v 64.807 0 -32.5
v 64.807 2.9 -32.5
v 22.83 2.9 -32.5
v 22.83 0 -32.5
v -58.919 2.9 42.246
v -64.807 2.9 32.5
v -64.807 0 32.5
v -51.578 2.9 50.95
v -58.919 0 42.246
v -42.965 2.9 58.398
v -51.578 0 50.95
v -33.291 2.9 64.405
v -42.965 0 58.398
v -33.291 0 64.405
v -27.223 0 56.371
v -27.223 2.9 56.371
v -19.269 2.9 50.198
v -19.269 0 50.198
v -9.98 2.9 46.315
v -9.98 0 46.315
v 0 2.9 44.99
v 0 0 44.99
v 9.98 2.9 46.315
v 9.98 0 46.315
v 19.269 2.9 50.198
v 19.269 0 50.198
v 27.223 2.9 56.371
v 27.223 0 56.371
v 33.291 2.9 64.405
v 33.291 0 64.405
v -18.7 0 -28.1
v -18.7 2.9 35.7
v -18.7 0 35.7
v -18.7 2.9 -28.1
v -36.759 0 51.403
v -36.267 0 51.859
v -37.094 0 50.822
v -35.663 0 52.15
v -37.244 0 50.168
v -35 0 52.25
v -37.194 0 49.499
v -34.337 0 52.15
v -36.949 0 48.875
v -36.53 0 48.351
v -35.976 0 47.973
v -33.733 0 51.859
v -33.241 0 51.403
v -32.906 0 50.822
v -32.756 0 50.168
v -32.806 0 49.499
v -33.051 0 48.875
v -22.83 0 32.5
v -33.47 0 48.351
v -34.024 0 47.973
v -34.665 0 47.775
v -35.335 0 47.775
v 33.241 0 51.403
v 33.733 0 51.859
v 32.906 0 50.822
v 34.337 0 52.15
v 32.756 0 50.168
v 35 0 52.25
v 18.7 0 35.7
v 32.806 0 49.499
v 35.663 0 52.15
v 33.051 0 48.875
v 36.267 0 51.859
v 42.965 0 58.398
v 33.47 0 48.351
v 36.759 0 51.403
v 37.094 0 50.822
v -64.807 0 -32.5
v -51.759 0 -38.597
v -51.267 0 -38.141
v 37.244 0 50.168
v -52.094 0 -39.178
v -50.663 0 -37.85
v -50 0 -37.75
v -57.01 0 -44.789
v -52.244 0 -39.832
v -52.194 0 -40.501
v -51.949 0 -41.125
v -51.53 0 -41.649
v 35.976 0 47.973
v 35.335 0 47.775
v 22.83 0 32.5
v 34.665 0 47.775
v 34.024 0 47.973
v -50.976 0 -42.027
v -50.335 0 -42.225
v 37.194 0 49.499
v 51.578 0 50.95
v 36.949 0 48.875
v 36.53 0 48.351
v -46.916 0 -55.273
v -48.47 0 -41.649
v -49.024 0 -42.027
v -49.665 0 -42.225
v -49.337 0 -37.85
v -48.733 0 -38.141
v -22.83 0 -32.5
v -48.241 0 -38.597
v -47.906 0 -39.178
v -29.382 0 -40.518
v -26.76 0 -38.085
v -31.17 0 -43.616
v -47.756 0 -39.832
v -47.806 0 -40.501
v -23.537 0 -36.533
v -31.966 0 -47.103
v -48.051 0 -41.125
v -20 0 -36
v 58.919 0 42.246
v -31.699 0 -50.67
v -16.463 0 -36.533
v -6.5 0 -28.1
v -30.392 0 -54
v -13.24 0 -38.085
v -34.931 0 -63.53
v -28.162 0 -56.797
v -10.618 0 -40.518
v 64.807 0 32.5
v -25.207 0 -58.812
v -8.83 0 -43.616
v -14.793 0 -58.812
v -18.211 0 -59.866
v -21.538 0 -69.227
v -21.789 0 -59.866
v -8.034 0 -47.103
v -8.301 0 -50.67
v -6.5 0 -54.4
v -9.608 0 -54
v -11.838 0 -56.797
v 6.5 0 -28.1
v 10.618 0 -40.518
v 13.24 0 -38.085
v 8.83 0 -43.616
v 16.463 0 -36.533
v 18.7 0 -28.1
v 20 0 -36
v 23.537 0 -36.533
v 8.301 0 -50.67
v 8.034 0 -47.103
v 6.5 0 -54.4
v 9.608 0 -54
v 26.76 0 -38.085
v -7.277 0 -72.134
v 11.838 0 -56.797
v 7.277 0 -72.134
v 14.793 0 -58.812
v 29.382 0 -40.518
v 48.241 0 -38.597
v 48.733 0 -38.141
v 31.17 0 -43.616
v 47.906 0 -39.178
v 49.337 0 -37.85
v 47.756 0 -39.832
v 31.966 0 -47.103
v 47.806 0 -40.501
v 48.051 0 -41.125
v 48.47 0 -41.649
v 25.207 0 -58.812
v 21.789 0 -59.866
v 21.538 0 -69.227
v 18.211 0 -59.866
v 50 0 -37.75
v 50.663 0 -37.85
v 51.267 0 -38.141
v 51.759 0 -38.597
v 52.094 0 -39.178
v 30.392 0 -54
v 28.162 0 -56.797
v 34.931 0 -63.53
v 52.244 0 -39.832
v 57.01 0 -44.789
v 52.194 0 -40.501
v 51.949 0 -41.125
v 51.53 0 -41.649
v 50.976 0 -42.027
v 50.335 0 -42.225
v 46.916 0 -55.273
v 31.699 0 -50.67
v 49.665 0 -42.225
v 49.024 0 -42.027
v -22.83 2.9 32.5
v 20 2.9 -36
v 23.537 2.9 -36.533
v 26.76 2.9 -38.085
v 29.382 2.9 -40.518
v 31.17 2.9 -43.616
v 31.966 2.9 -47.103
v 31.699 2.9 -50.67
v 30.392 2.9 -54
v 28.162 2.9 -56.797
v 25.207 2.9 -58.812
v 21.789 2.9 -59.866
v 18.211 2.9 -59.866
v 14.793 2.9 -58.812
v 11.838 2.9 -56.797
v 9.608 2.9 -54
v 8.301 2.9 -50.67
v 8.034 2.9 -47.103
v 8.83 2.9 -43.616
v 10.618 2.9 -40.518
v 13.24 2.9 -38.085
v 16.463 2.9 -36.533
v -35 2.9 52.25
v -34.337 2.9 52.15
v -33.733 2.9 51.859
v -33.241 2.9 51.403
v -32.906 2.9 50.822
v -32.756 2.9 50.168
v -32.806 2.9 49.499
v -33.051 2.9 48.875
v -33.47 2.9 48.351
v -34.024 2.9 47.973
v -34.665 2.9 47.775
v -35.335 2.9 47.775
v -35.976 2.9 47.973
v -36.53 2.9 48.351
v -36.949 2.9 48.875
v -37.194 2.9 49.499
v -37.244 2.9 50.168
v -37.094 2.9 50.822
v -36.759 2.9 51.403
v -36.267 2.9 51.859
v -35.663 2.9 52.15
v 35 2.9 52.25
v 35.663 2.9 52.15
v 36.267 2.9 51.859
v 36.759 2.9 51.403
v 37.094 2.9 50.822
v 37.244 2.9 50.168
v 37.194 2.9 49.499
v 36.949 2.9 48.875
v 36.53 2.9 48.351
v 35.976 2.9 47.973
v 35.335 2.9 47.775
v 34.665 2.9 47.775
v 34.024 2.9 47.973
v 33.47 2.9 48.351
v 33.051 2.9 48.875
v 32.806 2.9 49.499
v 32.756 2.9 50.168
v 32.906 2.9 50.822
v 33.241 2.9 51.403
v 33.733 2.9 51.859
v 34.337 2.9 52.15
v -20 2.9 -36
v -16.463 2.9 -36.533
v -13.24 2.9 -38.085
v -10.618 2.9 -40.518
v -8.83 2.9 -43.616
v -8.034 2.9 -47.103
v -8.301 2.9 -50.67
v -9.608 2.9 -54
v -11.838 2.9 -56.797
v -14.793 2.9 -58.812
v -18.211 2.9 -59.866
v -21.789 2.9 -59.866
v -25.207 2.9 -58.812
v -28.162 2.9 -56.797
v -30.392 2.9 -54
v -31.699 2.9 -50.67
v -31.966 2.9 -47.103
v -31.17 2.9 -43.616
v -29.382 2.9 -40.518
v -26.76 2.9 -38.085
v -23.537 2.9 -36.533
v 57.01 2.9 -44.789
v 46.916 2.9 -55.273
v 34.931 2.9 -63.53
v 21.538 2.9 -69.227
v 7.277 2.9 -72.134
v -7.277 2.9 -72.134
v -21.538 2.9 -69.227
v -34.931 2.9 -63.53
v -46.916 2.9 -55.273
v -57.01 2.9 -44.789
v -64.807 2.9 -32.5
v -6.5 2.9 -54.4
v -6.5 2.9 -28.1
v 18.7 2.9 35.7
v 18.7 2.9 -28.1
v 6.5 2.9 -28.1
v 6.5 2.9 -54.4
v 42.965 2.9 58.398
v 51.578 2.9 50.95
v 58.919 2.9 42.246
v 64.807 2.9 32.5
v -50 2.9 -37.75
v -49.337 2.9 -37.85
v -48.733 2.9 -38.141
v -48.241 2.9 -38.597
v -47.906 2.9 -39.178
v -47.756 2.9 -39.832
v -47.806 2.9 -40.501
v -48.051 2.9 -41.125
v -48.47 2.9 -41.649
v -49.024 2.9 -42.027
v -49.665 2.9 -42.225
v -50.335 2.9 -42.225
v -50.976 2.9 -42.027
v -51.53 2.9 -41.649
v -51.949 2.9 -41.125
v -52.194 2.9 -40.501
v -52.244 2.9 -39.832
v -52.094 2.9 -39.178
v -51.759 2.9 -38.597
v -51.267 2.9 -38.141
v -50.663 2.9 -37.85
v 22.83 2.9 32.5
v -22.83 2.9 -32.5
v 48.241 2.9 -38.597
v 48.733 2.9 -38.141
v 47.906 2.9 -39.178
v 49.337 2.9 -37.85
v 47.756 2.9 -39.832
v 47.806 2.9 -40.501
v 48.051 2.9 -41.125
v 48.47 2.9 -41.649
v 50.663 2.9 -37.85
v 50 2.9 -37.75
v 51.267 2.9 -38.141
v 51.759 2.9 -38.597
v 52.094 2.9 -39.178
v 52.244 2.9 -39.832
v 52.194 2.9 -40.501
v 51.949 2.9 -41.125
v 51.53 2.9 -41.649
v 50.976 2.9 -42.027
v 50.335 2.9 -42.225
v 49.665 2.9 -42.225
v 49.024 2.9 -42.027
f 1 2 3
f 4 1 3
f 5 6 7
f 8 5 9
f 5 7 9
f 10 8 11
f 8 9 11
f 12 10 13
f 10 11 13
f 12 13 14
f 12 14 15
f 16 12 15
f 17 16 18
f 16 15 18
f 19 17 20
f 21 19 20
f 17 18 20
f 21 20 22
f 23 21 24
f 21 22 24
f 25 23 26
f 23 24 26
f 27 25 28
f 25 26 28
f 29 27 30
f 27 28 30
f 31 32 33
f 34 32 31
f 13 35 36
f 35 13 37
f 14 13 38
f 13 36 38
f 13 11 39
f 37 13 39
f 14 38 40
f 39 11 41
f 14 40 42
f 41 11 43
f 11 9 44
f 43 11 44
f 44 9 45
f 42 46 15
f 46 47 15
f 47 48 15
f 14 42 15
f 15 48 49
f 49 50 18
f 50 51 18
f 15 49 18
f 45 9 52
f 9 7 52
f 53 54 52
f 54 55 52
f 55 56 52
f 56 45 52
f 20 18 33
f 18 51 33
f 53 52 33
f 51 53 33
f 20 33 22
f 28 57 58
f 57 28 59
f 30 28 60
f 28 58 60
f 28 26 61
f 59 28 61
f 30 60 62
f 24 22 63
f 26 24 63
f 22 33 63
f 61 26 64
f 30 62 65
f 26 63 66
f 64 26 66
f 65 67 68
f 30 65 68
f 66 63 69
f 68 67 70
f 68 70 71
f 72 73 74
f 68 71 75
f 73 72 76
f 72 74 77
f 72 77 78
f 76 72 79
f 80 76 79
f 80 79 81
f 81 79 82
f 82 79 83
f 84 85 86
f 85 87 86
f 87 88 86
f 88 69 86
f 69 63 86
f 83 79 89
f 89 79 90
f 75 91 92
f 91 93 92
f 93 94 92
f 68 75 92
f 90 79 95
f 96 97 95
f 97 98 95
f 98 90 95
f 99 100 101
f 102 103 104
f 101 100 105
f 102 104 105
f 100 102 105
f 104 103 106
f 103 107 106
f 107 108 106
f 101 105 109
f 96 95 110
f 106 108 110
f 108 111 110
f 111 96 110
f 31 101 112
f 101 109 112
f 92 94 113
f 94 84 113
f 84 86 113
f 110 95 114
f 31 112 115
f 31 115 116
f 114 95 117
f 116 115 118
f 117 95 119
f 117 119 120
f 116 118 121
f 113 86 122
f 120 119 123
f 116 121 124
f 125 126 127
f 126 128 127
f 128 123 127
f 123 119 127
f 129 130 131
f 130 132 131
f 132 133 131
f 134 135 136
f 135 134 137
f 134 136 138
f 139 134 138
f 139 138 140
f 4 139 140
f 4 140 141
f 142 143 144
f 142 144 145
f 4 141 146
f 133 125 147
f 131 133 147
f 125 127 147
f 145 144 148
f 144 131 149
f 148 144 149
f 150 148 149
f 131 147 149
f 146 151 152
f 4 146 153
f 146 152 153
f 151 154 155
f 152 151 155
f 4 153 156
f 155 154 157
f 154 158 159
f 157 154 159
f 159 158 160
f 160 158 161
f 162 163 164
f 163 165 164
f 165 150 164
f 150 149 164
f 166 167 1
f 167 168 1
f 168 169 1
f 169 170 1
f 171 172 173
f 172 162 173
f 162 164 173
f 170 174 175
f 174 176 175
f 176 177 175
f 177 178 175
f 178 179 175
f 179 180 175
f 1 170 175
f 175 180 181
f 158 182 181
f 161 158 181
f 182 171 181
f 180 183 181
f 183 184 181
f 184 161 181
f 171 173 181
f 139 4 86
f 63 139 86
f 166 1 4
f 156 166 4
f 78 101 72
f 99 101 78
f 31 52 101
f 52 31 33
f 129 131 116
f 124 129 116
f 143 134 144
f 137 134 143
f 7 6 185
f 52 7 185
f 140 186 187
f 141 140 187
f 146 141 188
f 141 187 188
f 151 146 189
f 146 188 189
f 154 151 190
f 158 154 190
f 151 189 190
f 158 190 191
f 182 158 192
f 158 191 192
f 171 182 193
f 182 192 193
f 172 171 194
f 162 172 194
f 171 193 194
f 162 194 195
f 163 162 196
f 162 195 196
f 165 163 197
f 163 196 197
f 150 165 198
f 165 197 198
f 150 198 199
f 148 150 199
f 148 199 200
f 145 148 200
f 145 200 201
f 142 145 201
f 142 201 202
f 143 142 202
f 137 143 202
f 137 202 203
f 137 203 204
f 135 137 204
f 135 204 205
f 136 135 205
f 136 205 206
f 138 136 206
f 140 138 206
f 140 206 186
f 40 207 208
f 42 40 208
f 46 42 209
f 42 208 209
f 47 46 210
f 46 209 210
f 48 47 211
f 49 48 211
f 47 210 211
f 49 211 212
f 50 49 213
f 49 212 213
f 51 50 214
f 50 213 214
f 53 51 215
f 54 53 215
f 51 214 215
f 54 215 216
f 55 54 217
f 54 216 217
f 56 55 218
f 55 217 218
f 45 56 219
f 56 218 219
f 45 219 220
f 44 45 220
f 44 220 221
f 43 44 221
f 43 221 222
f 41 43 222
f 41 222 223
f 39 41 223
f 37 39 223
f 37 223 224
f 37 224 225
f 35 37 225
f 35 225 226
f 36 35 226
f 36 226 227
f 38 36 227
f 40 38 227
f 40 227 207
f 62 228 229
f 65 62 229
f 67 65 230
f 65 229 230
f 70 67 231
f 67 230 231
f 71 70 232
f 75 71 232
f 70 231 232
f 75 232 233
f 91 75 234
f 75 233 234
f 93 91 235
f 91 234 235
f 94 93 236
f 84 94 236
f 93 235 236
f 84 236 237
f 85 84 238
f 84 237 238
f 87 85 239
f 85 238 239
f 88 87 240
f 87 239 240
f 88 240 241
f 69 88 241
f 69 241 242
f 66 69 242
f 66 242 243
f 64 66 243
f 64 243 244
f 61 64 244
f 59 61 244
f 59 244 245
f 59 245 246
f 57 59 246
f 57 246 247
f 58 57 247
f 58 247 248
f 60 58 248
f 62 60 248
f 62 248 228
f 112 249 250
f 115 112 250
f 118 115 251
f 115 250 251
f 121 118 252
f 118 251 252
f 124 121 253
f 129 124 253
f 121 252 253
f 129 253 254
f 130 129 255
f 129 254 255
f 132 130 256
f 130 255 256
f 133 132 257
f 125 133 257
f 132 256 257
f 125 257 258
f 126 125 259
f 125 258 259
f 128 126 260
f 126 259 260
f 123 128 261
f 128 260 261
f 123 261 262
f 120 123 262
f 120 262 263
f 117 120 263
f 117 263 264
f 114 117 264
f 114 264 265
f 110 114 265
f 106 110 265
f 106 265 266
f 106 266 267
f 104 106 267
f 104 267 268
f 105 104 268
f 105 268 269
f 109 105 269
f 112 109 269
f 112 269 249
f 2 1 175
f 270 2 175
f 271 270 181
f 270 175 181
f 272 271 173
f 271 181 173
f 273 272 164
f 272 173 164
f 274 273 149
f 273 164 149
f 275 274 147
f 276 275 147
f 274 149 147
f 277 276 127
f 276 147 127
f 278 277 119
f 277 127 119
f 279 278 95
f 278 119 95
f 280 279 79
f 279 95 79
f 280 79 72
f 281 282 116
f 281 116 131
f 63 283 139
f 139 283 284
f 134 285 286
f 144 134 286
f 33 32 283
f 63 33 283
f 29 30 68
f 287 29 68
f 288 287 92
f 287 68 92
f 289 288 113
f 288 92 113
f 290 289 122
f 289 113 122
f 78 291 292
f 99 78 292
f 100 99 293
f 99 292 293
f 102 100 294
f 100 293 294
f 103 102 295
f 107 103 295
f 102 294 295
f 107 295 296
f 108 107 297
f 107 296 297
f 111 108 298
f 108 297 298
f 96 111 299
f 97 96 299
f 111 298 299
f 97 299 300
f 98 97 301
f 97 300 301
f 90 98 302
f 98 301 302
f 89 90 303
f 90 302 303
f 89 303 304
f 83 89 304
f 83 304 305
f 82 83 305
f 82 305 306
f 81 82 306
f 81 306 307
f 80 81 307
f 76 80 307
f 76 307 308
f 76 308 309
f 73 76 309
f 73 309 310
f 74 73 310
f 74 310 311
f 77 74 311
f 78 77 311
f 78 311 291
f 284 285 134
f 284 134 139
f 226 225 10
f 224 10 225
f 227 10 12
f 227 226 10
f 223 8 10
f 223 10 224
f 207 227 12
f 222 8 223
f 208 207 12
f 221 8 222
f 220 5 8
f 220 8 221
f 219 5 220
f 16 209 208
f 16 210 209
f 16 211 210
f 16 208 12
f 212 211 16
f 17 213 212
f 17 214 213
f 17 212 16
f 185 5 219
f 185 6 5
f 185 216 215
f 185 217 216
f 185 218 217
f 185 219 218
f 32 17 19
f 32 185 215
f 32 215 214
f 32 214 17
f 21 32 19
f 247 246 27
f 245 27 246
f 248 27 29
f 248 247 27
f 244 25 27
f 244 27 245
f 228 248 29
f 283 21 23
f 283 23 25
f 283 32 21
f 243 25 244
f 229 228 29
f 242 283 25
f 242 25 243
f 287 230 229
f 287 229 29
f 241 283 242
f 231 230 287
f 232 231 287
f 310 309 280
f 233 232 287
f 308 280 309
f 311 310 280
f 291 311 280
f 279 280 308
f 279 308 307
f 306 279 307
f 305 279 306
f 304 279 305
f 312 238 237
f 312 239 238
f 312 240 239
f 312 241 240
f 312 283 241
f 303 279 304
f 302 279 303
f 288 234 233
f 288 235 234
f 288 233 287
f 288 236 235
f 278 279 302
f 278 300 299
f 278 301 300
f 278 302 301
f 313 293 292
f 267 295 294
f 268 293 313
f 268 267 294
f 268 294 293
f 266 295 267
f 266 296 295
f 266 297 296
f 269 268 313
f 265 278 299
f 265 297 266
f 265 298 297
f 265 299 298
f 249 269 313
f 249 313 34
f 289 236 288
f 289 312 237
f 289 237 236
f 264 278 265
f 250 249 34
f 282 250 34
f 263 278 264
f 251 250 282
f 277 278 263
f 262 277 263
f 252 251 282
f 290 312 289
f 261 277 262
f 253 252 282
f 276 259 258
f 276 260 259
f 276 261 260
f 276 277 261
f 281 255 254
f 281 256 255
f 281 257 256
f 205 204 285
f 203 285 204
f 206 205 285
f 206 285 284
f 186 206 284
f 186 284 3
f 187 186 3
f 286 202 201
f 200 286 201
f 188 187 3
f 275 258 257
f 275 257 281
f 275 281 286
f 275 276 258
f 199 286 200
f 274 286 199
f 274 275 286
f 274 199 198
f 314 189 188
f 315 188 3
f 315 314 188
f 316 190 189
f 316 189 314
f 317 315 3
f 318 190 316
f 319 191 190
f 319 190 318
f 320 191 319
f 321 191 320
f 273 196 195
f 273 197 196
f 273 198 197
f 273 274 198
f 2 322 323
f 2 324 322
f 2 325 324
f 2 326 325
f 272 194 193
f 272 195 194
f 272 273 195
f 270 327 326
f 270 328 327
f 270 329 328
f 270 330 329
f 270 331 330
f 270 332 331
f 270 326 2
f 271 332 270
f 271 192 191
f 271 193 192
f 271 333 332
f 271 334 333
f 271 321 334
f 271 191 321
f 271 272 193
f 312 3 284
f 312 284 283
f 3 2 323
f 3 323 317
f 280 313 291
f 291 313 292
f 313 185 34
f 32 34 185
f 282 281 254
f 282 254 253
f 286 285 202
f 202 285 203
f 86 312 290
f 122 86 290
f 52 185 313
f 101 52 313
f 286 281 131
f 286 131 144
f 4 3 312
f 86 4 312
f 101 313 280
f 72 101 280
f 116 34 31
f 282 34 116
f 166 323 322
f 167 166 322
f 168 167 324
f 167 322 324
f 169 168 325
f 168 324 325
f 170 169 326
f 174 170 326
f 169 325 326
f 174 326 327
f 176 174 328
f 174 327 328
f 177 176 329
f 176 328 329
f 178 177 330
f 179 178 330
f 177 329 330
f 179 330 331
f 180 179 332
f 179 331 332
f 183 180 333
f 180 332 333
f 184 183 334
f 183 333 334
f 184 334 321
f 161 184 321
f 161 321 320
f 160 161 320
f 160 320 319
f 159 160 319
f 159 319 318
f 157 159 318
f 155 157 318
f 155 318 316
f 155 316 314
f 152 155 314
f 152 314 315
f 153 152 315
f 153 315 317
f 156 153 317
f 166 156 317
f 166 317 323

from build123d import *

# Parameters (mm, degrees)
BOSS_EXTRUDE1_DEPTH  = 2.9
SOLENOID_PLACEMENT_W = 37.4
SOLENOID_PLACEMENT_H = 63.8
CUT_EXTRUDE1_DEPTH   = 103.571487266
CUT_EXTRUDE3_DEPTH   = 103.571487266
SKETCH4_W            = 13
SKETCH4_H            = 26.3
CUT_EXTRUDE4_DEPTH   = 98.286484159
SKETCH5_R            = 12
CUT_EXTRUDE5_DEPTH   = 98.286484159
SKETCH6_R            = 2.25
CUT_EXTRUDE6_DEPTH   = 98.286484159


with BuildPart() as part:
    # Sketch1 → Boss-Extrude1 (new body)
    with BuildSketch(Plane(origin=(0, 0, 0), x_dir=(1, 0, 0), z_dir=(0, 1, 0))):
        with BuildLine():
            ThreePointArc((33.29110537, -64.404598464), (0, 72.5), (-33.29110537, -64.404598464))
            ThreePointArc((-33.29110537, -64.404598464), (0, -44.989799638), (33.29110537, -64.404598464))
        make_face()
    extrude(amount=BOSS_EXTRUDE1_DEPTH)

    # solenoid placement → Cut-Extrude1 (cut, through all)
    with BuildSketch(Plane(origin=(0, 2.9, 0), x_dir=(1, 0, 0), z_dir=(0, 1, 0))):
        with Locations((0, -3.8)):
            Rectangle(SOLENOID_PLACEMENT_W, SOLENOID_PLACEMENT_H)
    extrude(amount=-CUT_EXTRUDE1_DEPTH, mode=Mode.SUBTRACT)

    # Sketch3 → Cut-Extrude3 (cut, through all)
    with BuildSketch(Plane(origin=(0, 2.9, 0), x_dir=(1, 0, 0), z_dir=(0, 1, 0))):
        with BuildLine():
            Line((-34.63, -32.5), (-22.83, -32.5))
            Line((-22.83, -32.5), (-22.83, 32.5))
            Line((-22.83, 32.5), (-64.807406984, 32.5))
            ThreePointArc((-64.807406984, 32.5), (-72.5, 0), (-64.807406984, -32.5))
            Line((-64.807406984, -32.5), (-34.63, -32.5))
        make_face()
        with BuildLine():
            Line((34.63, -32.5), (64.807406984, -32.5))
            ThreePointArc((64.807406984, -32.5), (72.5, 0), (64.807406984, 32.5))
            Line((64.807406984, 32.5), (22.83, 32.5))
            Line((22.83, 32.5), (22.83, -32.5))
            Line((22.83, -32.5), (34.63, -32.5))
        make_face()
    extrude(amount=-CUT_EXTRUDE3_DEPTH, mode=Mode.SUBTRACT)

    # Sketch4 → Cut-Extrude4 (cut, through all)
    with BuildSketch(Plane(origin=(0, 2.9, 0), x_dir=(1, 0, 0), z_dir=(0, 1, 0))):
        with Locations((0, 41.25)):
            Rectangle(SKETCH4_W, SKETCH4_H)
    extrude(amount=-CUT_EXTRUDE4_DEPTH, mode=Mode.SUBTRACT)

    # Sketch5 → Cut-Extrude5 (cut, through all)
    with BuildSketch(Plane(origin=(0, 2.9, 0), x_dir=(1, 0, 0), z_dir=(0, 1, 0))):
        with Locations(Location((-20, 48, 0), (0, 0, 270))):
            Circle(SKETCH5_R)
        with Locations(Location((20, 48, 0), (0, 0, 270))):
            Circle(SKETCH5_R)
    extrude(amount=-CUT_EXTRUDE5_DEPTH, mode=Mode.SUBTRACT)

    # Sketch6 → Cut-Extrude6 (cut, through all)
    with BuildSketch(Plane(origin=(0, 2.9, 0), x_dir=(1, 0, 0), z_dir=(0, 1, 0))):
        with Locations(Location((35, -50, 0), (0, 0, 270))):
            Circle(SKETCH6_R)
        with Locations(Location((-35, -50, 0), (0, 0, 270))):
            Circle(SKETCH6_R)
        with Locations(Location((-50, 40, 0), (0, 0, 270))):
            Circle(SKETCH6_R)
        with Locations(Location((50, 40, 0), (0, 0, 270))):
            Circle(SKETCH6_R)
    extrude(amount=-CUT_EXTRUDE6_DEPTH, mode=Mode.SUBTRACT)


solid = part.part
